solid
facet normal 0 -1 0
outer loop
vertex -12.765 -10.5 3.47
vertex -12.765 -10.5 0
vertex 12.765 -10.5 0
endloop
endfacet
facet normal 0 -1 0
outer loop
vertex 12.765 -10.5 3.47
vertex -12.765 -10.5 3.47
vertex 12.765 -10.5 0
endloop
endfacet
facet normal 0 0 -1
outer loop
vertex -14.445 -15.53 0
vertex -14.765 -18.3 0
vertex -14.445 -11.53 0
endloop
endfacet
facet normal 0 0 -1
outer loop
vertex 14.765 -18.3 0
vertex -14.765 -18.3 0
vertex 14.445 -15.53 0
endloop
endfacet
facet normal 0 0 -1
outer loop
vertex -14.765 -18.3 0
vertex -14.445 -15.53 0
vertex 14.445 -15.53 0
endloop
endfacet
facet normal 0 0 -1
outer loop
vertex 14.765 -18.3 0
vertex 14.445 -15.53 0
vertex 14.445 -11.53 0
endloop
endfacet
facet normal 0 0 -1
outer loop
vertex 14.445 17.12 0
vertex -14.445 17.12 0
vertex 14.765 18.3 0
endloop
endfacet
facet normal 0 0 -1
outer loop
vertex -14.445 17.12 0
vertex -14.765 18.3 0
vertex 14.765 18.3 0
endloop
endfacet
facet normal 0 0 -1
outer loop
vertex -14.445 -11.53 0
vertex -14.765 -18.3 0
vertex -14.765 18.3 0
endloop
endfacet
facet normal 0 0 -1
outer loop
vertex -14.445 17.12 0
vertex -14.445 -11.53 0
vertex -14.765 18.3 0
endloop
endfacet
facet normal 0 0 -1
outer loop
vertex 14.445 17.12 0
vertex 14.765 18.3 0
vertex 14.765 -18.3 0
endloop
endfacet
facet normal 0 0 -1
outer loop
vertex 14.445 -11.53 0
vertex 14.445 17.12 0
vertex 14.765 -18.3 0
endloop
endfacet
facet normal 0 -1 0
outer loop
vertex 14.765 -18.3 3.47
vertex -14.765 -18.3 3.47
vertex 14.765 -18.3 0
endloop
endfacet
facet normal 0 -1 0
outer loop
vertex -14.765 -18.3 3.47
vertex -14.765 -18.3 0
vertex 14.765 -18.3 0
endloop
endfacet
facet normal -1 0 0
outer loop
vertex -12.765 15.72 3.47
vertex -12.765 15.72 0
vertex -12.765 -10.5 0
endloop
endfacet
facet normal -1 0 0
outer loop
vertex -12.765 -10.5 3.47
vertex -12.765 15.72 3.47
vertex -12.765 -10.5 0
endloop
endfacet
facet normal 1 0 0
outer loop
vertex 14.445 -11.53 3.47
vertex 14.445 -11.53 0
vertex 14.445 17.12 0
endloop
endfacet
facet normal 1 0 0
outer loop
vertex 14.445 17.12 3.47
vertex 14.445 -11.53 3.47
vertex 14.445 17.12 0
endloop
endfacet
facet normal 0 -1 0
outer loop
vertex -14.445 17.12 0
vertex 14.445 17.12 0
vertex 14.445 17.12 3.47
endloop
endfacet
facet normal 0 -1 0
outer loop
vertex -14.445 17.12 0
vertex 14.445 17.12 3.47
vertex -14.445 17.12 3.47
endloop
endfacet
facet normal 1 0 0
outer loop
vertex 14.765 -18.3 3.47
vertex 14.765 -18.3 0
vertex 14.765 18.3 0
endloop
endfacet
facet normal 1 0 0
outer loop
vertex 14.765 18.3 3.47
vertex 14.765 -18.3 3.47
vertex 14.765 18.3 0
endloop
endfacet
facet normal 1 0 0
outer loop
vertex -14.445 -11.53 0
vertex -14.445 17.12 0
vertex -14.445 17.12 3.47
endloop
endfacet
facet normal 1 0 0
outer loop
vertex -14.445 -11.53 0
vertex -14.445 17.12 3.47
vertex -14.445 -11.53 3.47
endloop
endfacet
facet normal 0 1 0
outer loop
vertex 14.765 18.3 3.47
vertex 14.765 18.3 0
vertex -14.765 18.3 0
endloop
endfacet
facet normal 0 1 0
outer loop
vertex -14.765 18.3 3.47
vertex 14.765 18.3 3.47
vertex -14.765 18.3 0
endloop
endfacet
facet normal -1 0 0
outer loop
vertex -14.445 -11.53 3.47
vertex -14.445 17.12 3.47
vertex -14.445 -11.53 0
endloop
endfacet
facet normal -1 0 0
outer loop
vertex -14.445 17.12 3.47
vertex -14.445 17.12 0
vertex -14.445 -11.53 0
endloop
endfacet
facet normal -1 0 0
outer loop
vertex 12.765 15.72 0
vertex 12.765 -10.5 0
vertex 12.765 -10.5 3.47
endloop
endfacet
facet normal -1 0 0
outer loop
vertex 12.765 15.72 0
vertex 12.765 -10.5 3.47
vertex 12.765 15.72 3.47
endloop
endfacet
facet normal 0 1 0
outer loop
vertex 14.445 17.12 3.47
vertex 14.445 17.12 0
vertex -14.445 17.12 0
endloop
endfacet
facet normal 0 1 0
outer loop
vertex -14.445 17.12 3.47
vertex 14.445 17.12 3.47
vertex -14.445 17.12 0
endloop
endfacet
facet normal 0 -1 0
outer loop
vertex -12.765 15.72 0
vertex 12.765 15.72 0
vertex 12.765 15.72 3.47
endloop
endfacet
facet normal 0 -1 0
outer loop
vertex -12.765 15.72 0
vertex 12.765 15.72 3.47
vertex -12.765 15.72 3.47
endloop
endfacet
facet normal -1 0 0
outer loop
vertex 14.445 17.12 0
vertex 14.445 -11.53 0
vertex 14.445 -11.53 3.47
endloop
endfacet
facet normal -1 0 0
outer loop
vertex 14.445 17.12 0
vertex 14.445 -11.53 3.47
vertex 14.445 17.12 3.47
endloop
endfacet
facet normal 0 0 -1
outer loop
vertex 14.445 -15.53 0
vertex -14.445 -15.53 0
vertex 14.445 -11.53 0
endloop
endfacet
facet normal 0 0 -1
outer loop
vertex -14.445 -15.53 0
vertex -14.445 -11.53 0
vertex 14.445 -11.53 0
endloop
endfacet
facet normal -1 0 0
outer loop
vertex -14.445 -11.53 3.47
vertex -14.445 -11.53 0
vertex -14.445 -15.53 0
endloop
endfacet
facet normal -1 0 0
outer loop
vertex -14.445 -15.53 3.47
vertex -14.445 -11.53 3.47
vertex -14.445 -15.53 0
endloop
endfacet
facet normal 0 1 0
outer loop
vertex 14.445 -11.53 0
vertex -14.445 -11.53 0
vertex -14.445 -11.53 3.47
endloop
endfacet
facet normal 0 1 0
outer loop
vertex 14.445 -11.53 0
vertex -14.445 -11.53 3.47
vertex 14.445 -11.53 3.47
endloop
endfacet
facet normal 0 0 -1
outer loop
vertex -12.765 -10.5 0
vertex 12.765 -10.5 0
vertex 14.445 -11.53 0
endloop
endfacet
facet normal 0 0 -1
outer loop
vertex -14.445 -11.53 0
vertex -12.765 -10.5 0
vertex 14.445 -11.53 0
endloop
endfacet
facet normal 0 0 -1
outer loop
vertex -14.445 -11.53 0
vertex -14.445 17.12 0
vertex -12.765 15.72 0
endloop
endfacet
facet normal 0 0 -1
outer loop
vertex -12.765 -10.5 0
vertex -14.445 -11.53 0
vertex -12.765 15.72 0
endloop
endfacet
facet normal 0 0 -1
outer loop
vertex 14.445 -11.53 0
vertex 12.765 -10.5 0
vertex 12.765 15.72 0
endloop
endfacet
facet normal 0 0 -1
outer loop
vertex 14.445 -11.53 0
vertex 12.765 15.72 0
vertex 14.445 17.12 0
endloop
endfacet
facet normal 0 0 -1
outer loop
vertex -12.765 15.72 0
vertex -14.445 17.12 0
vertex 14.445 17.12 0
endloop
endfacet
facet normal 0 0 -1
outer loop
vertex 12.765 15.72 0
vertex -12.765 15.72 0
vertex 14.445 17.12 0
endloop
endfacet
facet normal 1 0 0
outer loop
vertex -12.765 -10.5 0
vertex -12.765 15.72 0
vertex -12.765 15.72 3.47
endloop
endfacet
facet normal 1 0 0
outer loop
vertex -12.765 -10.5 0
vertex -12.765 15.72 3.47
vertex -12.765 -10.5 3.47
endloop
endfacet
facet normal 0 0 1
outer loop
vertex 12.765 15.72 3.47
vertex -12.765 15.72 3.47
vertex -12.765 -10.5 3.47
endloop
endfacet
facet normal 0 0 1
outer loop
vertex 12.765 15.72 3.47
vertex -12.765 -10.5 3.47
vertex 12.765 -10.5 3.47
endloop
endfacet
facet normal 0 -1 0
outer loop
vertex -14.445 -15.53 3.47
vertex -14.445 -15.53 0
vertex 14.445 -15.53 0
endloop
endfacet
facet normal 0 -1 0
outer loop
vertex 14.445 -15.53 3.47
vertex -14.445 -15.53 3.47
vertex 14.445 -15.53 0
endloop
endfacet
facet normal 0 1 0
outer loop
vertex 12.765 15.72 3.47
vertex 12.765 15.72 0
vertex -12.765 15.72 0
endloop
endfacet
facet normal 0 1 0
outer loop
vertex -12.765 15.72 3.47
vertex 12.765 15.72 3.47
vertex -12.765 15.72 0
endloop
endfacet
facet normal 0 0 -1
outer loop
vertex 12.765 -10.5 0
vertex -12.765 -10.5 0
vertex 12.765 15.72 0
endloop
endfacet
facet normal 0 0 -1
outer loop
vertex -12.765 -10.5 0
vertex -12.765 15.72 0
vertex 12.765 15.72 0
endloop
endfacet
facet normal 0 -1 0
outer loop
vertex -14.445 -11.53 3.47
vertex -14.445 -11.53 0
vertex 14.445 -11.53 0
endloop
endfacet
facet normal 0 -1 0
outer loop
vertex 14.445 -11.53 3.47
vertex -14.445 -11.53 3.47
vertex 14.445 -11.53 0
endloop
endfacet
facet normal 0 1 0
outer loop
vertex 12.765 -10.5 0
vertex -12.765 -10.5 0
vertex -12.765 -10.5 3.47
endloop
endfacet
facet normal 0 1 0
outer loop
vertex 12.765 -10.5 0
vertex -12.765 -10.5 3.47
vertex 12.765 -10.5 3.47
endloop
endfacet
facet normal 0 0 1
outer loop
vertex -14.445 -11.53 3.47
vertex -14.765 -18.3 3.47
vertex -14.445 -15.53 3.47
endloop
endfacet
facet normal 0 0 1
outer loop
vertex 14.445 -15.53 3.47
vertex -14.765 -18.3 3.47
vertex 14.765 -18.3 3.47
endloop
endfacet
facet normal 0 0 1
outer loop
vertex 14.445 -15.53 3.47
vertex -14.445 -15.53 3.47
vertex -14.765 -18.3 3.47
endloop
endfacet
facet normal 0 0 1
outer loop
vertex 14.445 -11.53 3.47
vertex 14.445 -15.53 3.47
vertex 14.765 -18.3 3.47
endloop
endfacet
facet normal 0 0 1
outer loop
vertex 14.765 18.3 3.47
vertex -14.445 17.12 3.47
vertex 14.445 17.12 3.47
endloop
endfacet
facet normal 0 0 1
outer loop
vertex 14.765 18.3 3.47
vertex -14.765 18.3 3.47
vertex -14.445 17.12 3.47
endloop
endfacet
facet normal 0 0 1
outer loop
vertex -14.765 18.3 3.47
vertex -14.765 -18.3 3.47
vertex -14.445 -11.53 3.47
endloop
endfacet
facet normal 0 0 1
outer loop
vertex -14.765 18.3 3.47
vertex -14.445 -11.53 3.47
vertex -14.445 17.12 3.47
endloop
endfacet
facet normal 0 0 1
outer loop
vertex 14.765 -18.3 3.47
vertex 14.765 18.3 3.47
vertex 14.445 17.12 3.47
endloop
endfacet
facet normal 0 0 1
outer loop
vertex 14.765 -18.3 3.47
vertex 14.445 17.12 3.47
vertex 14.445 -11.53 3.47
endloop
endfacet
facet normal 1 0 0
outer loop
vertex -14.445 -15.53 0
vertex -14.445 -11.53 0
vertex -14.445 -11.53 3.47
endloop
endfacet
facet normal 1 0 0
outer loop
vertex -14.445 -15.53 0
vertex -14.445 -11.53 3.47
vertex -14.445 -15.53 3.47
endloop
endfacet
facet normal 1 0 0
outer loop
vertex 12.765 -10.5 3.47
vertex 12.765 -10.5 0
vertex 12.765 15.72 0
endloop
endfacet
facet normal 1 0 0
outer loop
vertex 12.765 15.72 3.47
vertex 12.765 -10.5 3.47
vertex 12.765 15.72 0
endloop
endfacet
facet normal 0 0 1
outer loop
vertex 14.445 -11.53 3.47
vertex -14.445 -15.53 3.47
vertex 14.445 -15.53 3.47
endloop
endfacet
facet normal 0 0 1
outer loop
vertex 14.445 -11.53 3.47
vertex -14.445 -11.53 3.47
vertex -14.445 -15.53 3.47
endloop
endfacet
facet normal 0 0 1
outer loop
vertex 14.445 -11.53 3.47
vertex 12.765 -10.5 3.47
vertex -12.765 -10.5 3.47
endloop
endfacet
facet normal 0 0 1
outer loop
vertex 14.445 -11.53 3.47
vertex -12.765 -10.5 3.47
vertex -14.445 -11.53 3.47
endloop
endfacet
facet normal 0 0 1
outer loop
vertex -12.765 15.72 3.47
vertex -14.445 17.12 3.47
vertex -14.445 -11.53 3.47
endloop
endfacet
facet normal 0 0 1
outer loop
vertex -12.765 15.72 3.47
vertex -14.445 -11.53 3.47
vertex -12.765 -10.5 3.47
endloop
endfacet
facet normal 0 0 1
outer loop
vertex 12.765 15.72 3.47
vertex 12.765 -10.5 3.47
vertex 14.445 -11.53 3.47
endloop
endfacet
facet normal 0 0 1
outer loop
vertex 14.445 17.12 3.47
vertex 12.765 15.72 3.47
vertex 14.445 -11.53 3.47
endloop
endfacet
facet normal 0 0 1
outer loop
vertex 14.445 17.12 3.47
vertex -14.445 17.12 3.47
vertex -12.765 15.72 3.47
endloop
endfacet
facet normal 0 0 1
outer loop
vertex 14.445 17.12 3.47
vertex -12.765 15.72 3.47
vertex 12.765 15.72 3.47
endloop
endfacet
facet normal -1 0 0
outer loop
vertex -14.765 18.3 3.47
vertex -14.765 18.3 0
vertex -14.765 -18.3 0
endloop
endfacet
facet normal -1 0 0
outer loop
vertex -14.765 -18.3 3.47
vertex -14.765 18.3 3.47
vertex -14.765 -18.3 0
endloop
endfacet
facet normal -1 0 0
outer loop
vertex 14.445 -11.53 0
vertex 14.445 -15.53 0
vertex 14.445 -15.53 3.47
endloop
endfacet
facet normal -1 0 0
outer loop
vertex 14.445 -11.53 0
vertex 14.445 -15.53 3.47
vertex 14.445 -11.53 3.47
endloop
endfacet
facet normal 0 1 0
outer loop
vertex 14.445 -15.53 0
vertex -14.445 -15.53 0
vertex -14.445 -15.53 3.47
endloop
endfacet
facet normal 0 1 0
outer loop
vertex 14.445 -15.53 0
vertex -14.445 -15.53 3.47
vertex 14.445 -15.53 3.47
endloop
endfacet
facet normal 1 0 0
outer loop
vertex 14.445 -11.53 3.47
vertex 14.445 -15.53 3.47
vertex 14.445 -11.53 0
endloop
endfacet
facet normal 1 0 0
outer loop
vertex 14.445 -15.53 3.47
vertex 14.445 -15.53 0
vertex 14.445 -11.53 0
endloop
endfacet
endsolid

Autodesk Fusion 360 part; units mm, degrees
sketch "Sketch1" plane through (0, 0, 0) normal (0, 0, 1) x (1, 0, 0)
  line L0 (14.765, 18.3) -> (-14.765, 18.3)
  line L1 (-14.765, 18.3) -> (-14.765, -18.3)
  line L2 (-14.765, -18.3) -> (14.765, -18.3)
  line L3 (14.765, -18.3) -> (14.765, 18.3)
  line L4 (14.765, 18.3) -> (-14.765, -18.3) construction
  line L5 (-14.765, 18.3) -> (14.765, -18.3) construction
  line L6 (12.765, 15.72) -> (-12.765, 15.72)
  line L7 (-12.765, -10.5) -> (12.765, -10.5)
  line L8 (12.765, -10.5) -> (12.765, 15.72)
  line L9 (-12.765, 15.72) -> (-12.765, -10.5)
  line L10 (14.445, -15.53) -> (14.445, 17.12)
  line L11 (-14.445, 17.12) -> (-14.445, -15.53)
  line L12 (14.445, 17.12) -> (-14.445, 17.12)
  line L13 (-14.445, -15.53) -> (14.445, -15.53)
  line L14 (-14.445, -11.53) -> (14.445, -11.53)
  dimension "d1" = 29.53
  dimension "d2" = 36.6
  dimension "d3" = -2.58
  dimension "d4" = -7.8
  dimension "d5" = -2
  dimension "d6" = -2
  dimension "d7" = -0.32
  dimension "d8" = -1.18
  dimension "d9" = -2.77
  dimension "d10" = -4
extrude "Extrude1" add sketch "Sketch1" along normal blind 3.47 contours L0 L1 L2 L3 makes body 1
extrude "Extrude2" add sketch "Sketch1" along normal blind 3.47 separate body contours L10 L11 L13 L14 makes body 2
extrude "Extrude3" add sketch "Sketch1" along normal blind 3.47 separate body contours L10 L11 L12 L14 makes body 3
extrude "Extrude4" add sketch "Sketch1" along normal blind 3.47 separate body contours L6 L7 L8 L9 makes body 4
